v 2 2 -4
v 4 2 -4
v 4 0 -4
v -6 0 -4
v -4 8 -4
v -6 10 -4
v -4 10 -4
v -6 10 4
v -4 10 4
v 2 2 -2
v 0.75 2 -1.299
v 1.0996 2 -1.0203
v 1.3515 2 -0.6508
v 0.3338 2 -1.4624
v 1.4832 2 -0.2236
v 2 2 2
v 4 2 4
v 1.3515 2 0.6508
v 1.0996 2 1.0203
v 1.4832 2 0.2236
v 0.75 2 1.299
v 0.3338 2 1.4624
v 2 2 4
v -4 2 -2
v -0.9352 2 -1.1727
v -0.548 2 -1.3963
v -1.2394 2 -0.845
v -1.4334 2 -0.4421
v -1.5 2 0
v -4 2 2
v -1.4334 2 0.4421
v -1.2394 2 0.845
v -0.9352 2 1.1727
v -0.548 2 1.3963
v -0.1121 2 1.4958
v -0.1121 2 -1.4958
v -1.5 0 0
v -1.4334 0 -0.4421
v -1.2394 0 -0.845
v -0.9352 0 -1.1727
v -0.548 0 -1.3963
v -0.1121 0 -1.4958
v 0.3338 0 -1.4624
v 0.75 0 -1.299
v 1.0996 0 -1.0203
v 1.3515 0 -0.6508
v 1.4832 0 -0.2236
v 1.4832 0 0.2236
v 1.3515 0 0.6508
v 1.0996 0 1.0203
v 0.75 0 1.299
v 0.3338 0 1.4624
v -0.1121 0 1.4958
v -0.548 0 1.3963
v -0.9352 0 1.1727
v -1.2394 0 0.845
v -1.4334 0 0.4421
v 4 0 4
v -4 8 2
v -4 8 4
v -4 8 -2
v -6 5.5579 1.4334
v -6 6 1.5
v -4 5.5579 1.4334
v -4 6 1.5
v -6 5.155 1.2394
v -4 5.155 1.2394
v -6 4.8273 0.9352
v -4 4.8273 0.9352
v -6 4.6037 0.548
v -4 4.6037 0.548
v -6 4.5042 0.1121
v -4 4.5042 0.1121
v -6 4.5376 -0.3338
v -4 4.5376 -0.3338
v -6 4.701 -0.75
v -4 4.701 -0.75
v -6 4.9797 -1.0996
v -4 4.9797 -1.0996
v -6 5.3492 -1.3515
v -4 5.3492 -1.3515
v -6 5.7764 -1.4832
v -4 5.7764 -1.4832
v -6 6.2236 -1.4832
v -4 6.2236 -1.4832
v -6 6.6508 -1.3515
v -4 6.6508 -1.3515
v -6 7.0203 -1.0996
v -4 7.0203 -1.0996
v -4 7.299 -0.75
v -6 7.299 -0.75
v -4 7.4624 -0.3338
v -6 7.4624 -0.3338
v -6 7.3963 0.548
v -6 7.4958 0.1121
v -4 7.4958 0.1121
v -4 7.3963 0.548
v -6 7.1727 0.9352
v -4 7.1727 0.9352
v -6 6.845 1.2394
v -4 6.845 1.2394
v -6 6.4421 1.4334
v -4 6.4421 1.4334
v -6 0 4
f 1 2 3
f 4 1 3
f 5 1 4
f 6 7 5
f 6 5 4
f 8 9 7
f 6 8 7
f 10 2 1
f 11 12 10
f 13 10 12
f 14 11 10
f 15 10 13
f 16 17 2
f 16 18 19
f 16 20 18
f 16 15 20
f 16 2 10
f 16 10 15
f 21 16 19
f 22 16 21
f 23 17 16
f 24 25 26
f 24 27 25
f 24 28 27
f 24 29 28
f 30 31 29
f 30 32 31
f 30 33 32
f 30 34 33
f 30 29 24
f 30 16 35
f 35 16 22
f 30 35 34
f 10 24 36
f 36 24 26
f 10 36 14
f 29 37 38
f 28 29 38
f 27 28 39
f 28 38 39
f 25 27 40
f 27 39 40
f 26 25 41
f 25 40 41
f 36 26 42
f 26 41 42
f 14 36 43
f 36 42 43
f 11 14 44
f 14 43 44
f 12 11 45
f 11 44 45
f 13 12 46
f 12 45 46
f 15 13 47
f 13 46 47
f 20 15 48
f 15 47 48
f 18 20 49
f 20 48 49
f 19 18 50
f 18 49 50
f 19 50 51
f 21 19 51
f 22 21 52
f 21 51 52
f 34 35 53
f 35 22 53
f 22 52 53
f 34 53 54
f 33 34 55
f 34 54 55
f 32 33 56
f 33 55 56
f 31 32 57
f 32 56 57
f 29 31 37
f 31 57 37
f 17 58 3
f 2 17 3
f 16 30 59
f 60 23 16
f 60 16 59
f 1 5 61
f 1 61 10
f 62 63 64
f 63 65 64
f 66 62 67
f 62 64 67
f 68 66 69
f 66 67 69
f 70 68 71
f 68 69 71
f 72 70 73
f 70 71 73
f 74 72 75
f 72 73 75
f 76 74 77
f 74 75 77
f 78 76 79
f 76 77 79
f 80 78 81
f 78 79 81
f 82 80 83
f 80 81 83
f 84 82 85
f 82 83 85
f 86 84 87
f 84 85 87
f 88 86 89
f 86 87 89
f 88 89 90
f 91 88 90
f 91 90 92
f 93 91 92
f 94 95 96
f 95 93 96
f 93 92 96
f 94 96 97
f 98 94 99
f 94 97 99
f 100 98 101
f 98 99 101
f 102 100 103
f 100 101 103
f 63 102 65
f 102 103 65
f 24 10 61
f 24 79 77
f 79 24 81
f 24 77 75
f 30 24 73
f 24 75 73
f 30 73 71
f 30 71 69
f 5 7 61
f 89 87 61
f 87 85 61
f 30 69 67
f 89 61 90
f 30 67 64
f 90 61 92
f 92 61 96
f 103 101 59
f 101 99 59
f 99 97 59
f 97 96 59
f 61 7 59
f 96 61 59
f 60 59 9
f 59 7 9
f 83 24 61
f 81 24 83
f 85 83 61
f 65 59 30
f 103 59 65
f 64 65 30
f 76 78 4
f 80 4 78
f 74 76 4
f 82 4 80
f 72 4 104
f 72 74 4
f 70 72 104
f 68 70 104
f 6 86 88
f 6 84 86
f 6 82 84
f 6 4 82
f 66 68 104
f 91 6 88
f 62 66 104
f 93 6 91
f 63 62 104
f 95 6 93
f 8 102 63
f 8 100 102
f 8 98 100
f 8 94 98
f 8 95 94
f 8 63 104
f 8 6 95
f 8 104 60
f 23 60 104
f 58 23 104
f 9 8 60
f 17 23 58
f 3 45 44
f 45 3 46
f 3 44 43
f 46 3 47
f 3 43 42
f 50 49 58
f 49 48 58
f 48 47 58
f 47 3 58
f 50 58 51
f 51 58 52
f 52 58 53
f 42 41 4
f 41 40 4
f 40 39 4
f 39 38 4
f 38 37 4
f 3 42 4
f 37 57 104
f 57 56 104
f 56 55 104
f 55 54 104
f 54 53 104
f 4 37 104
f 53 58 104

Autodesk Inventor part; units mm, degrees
ref_plane "YZ Plane" through (0, 0, 0) normal (1, 0, 0) x (0, 1, 0)
ref_plane "XZ Plane" through (0, 0, 0) normal (0, 1, 0) x (-1, 0, 0)
ref_plane "XY Plane" through (0, 0, 0) normal (0, 0, 1) x (1, 0, 0)
sketch "Boceto1" plane through (0, 0, 0) normal (0, 1, 0) x (-1, 0, 0)
  circle A0 centre (0, 0) radius 1.5
  line L0 (4, 4) -> (-4, 4)
  line L1 (-4, 4) -> (-4, -4)
  line L2 (-4, -4) -> (4, -4)
  line L3 (4, -4) -> (4, 4)
  dimension "d0" = 3
extrude "Extrusión1" add sketch "Boceto1" along normal blind 2
sketch "Boceto2" plane through (-4, 0, -4) normal (-1, 0, 0) x (0, 0, 1)
  circle A0 centre (4, 6) radius 1.5
  line L0 (8, 2) -> (8, 10)
  line L1 (8, 10) -> (0, 10)
  line L2 (0, 10) -> (0, 2)
  line L3 (8, 0) -> (0, 0) projected
  line L4 (0, 0) -> (8, 0)
  line L5 (8, 0) -> (8, 2)
  line L6 (0, 2) -> (0, 0)
  line L7 (0, 0) -> (8, 0)
  line L8 (8, 0) -> (8, 10)
  line L9 (8, 10) -> (0, 10)
  line L10 (0, 10) -> (0, 0)
  point P0 (4, 0)
extrude "Extrusión2" add sketch "Boceto2" along normal blind 2
sketch "Boceto3" plane through (4, 0, 4) normal (0, 0, 1) x (1, 0, 0)
  line L0 (-8, 2) -> (-8, 10) projected
  line L1 (-8, 10) -> (-8, 8)
  line L2 (0, 2) -> (-2, 2)
  line L3 (-2, 2) -> (-8, 8)
  line L4 (-2, 2) -> (-8, 2)
  line L5 (-8, 8) -> (-8, 2)
  point P0 (-5.5, 2)
  point P1 (-8, 4.5)
  dimension "d26" = 2
  dimension "d27" = 2
extrude "Extrusión8" add sketch "Boceto3" against normal blind 2
sketch "Boceto9" plane through (4, 0, -4) normal (0, 0, -1) x (-1, 0, 0)
  line L0 (0, 2) -> (8, 2) projected
  line L1 (8, 8) -> (2, 2) projected
  line L2 (2, 2) -> (8, 8)
  line L3 (8, 8) -> (8, 2)
  line L4 (8, 2) -> (2, 2)
  point P0 (4, 0)
extrude "Extrusión9" add sketch "Boceto9" against normal blind 2
properties part number "Base auxiliar - esquadra"
